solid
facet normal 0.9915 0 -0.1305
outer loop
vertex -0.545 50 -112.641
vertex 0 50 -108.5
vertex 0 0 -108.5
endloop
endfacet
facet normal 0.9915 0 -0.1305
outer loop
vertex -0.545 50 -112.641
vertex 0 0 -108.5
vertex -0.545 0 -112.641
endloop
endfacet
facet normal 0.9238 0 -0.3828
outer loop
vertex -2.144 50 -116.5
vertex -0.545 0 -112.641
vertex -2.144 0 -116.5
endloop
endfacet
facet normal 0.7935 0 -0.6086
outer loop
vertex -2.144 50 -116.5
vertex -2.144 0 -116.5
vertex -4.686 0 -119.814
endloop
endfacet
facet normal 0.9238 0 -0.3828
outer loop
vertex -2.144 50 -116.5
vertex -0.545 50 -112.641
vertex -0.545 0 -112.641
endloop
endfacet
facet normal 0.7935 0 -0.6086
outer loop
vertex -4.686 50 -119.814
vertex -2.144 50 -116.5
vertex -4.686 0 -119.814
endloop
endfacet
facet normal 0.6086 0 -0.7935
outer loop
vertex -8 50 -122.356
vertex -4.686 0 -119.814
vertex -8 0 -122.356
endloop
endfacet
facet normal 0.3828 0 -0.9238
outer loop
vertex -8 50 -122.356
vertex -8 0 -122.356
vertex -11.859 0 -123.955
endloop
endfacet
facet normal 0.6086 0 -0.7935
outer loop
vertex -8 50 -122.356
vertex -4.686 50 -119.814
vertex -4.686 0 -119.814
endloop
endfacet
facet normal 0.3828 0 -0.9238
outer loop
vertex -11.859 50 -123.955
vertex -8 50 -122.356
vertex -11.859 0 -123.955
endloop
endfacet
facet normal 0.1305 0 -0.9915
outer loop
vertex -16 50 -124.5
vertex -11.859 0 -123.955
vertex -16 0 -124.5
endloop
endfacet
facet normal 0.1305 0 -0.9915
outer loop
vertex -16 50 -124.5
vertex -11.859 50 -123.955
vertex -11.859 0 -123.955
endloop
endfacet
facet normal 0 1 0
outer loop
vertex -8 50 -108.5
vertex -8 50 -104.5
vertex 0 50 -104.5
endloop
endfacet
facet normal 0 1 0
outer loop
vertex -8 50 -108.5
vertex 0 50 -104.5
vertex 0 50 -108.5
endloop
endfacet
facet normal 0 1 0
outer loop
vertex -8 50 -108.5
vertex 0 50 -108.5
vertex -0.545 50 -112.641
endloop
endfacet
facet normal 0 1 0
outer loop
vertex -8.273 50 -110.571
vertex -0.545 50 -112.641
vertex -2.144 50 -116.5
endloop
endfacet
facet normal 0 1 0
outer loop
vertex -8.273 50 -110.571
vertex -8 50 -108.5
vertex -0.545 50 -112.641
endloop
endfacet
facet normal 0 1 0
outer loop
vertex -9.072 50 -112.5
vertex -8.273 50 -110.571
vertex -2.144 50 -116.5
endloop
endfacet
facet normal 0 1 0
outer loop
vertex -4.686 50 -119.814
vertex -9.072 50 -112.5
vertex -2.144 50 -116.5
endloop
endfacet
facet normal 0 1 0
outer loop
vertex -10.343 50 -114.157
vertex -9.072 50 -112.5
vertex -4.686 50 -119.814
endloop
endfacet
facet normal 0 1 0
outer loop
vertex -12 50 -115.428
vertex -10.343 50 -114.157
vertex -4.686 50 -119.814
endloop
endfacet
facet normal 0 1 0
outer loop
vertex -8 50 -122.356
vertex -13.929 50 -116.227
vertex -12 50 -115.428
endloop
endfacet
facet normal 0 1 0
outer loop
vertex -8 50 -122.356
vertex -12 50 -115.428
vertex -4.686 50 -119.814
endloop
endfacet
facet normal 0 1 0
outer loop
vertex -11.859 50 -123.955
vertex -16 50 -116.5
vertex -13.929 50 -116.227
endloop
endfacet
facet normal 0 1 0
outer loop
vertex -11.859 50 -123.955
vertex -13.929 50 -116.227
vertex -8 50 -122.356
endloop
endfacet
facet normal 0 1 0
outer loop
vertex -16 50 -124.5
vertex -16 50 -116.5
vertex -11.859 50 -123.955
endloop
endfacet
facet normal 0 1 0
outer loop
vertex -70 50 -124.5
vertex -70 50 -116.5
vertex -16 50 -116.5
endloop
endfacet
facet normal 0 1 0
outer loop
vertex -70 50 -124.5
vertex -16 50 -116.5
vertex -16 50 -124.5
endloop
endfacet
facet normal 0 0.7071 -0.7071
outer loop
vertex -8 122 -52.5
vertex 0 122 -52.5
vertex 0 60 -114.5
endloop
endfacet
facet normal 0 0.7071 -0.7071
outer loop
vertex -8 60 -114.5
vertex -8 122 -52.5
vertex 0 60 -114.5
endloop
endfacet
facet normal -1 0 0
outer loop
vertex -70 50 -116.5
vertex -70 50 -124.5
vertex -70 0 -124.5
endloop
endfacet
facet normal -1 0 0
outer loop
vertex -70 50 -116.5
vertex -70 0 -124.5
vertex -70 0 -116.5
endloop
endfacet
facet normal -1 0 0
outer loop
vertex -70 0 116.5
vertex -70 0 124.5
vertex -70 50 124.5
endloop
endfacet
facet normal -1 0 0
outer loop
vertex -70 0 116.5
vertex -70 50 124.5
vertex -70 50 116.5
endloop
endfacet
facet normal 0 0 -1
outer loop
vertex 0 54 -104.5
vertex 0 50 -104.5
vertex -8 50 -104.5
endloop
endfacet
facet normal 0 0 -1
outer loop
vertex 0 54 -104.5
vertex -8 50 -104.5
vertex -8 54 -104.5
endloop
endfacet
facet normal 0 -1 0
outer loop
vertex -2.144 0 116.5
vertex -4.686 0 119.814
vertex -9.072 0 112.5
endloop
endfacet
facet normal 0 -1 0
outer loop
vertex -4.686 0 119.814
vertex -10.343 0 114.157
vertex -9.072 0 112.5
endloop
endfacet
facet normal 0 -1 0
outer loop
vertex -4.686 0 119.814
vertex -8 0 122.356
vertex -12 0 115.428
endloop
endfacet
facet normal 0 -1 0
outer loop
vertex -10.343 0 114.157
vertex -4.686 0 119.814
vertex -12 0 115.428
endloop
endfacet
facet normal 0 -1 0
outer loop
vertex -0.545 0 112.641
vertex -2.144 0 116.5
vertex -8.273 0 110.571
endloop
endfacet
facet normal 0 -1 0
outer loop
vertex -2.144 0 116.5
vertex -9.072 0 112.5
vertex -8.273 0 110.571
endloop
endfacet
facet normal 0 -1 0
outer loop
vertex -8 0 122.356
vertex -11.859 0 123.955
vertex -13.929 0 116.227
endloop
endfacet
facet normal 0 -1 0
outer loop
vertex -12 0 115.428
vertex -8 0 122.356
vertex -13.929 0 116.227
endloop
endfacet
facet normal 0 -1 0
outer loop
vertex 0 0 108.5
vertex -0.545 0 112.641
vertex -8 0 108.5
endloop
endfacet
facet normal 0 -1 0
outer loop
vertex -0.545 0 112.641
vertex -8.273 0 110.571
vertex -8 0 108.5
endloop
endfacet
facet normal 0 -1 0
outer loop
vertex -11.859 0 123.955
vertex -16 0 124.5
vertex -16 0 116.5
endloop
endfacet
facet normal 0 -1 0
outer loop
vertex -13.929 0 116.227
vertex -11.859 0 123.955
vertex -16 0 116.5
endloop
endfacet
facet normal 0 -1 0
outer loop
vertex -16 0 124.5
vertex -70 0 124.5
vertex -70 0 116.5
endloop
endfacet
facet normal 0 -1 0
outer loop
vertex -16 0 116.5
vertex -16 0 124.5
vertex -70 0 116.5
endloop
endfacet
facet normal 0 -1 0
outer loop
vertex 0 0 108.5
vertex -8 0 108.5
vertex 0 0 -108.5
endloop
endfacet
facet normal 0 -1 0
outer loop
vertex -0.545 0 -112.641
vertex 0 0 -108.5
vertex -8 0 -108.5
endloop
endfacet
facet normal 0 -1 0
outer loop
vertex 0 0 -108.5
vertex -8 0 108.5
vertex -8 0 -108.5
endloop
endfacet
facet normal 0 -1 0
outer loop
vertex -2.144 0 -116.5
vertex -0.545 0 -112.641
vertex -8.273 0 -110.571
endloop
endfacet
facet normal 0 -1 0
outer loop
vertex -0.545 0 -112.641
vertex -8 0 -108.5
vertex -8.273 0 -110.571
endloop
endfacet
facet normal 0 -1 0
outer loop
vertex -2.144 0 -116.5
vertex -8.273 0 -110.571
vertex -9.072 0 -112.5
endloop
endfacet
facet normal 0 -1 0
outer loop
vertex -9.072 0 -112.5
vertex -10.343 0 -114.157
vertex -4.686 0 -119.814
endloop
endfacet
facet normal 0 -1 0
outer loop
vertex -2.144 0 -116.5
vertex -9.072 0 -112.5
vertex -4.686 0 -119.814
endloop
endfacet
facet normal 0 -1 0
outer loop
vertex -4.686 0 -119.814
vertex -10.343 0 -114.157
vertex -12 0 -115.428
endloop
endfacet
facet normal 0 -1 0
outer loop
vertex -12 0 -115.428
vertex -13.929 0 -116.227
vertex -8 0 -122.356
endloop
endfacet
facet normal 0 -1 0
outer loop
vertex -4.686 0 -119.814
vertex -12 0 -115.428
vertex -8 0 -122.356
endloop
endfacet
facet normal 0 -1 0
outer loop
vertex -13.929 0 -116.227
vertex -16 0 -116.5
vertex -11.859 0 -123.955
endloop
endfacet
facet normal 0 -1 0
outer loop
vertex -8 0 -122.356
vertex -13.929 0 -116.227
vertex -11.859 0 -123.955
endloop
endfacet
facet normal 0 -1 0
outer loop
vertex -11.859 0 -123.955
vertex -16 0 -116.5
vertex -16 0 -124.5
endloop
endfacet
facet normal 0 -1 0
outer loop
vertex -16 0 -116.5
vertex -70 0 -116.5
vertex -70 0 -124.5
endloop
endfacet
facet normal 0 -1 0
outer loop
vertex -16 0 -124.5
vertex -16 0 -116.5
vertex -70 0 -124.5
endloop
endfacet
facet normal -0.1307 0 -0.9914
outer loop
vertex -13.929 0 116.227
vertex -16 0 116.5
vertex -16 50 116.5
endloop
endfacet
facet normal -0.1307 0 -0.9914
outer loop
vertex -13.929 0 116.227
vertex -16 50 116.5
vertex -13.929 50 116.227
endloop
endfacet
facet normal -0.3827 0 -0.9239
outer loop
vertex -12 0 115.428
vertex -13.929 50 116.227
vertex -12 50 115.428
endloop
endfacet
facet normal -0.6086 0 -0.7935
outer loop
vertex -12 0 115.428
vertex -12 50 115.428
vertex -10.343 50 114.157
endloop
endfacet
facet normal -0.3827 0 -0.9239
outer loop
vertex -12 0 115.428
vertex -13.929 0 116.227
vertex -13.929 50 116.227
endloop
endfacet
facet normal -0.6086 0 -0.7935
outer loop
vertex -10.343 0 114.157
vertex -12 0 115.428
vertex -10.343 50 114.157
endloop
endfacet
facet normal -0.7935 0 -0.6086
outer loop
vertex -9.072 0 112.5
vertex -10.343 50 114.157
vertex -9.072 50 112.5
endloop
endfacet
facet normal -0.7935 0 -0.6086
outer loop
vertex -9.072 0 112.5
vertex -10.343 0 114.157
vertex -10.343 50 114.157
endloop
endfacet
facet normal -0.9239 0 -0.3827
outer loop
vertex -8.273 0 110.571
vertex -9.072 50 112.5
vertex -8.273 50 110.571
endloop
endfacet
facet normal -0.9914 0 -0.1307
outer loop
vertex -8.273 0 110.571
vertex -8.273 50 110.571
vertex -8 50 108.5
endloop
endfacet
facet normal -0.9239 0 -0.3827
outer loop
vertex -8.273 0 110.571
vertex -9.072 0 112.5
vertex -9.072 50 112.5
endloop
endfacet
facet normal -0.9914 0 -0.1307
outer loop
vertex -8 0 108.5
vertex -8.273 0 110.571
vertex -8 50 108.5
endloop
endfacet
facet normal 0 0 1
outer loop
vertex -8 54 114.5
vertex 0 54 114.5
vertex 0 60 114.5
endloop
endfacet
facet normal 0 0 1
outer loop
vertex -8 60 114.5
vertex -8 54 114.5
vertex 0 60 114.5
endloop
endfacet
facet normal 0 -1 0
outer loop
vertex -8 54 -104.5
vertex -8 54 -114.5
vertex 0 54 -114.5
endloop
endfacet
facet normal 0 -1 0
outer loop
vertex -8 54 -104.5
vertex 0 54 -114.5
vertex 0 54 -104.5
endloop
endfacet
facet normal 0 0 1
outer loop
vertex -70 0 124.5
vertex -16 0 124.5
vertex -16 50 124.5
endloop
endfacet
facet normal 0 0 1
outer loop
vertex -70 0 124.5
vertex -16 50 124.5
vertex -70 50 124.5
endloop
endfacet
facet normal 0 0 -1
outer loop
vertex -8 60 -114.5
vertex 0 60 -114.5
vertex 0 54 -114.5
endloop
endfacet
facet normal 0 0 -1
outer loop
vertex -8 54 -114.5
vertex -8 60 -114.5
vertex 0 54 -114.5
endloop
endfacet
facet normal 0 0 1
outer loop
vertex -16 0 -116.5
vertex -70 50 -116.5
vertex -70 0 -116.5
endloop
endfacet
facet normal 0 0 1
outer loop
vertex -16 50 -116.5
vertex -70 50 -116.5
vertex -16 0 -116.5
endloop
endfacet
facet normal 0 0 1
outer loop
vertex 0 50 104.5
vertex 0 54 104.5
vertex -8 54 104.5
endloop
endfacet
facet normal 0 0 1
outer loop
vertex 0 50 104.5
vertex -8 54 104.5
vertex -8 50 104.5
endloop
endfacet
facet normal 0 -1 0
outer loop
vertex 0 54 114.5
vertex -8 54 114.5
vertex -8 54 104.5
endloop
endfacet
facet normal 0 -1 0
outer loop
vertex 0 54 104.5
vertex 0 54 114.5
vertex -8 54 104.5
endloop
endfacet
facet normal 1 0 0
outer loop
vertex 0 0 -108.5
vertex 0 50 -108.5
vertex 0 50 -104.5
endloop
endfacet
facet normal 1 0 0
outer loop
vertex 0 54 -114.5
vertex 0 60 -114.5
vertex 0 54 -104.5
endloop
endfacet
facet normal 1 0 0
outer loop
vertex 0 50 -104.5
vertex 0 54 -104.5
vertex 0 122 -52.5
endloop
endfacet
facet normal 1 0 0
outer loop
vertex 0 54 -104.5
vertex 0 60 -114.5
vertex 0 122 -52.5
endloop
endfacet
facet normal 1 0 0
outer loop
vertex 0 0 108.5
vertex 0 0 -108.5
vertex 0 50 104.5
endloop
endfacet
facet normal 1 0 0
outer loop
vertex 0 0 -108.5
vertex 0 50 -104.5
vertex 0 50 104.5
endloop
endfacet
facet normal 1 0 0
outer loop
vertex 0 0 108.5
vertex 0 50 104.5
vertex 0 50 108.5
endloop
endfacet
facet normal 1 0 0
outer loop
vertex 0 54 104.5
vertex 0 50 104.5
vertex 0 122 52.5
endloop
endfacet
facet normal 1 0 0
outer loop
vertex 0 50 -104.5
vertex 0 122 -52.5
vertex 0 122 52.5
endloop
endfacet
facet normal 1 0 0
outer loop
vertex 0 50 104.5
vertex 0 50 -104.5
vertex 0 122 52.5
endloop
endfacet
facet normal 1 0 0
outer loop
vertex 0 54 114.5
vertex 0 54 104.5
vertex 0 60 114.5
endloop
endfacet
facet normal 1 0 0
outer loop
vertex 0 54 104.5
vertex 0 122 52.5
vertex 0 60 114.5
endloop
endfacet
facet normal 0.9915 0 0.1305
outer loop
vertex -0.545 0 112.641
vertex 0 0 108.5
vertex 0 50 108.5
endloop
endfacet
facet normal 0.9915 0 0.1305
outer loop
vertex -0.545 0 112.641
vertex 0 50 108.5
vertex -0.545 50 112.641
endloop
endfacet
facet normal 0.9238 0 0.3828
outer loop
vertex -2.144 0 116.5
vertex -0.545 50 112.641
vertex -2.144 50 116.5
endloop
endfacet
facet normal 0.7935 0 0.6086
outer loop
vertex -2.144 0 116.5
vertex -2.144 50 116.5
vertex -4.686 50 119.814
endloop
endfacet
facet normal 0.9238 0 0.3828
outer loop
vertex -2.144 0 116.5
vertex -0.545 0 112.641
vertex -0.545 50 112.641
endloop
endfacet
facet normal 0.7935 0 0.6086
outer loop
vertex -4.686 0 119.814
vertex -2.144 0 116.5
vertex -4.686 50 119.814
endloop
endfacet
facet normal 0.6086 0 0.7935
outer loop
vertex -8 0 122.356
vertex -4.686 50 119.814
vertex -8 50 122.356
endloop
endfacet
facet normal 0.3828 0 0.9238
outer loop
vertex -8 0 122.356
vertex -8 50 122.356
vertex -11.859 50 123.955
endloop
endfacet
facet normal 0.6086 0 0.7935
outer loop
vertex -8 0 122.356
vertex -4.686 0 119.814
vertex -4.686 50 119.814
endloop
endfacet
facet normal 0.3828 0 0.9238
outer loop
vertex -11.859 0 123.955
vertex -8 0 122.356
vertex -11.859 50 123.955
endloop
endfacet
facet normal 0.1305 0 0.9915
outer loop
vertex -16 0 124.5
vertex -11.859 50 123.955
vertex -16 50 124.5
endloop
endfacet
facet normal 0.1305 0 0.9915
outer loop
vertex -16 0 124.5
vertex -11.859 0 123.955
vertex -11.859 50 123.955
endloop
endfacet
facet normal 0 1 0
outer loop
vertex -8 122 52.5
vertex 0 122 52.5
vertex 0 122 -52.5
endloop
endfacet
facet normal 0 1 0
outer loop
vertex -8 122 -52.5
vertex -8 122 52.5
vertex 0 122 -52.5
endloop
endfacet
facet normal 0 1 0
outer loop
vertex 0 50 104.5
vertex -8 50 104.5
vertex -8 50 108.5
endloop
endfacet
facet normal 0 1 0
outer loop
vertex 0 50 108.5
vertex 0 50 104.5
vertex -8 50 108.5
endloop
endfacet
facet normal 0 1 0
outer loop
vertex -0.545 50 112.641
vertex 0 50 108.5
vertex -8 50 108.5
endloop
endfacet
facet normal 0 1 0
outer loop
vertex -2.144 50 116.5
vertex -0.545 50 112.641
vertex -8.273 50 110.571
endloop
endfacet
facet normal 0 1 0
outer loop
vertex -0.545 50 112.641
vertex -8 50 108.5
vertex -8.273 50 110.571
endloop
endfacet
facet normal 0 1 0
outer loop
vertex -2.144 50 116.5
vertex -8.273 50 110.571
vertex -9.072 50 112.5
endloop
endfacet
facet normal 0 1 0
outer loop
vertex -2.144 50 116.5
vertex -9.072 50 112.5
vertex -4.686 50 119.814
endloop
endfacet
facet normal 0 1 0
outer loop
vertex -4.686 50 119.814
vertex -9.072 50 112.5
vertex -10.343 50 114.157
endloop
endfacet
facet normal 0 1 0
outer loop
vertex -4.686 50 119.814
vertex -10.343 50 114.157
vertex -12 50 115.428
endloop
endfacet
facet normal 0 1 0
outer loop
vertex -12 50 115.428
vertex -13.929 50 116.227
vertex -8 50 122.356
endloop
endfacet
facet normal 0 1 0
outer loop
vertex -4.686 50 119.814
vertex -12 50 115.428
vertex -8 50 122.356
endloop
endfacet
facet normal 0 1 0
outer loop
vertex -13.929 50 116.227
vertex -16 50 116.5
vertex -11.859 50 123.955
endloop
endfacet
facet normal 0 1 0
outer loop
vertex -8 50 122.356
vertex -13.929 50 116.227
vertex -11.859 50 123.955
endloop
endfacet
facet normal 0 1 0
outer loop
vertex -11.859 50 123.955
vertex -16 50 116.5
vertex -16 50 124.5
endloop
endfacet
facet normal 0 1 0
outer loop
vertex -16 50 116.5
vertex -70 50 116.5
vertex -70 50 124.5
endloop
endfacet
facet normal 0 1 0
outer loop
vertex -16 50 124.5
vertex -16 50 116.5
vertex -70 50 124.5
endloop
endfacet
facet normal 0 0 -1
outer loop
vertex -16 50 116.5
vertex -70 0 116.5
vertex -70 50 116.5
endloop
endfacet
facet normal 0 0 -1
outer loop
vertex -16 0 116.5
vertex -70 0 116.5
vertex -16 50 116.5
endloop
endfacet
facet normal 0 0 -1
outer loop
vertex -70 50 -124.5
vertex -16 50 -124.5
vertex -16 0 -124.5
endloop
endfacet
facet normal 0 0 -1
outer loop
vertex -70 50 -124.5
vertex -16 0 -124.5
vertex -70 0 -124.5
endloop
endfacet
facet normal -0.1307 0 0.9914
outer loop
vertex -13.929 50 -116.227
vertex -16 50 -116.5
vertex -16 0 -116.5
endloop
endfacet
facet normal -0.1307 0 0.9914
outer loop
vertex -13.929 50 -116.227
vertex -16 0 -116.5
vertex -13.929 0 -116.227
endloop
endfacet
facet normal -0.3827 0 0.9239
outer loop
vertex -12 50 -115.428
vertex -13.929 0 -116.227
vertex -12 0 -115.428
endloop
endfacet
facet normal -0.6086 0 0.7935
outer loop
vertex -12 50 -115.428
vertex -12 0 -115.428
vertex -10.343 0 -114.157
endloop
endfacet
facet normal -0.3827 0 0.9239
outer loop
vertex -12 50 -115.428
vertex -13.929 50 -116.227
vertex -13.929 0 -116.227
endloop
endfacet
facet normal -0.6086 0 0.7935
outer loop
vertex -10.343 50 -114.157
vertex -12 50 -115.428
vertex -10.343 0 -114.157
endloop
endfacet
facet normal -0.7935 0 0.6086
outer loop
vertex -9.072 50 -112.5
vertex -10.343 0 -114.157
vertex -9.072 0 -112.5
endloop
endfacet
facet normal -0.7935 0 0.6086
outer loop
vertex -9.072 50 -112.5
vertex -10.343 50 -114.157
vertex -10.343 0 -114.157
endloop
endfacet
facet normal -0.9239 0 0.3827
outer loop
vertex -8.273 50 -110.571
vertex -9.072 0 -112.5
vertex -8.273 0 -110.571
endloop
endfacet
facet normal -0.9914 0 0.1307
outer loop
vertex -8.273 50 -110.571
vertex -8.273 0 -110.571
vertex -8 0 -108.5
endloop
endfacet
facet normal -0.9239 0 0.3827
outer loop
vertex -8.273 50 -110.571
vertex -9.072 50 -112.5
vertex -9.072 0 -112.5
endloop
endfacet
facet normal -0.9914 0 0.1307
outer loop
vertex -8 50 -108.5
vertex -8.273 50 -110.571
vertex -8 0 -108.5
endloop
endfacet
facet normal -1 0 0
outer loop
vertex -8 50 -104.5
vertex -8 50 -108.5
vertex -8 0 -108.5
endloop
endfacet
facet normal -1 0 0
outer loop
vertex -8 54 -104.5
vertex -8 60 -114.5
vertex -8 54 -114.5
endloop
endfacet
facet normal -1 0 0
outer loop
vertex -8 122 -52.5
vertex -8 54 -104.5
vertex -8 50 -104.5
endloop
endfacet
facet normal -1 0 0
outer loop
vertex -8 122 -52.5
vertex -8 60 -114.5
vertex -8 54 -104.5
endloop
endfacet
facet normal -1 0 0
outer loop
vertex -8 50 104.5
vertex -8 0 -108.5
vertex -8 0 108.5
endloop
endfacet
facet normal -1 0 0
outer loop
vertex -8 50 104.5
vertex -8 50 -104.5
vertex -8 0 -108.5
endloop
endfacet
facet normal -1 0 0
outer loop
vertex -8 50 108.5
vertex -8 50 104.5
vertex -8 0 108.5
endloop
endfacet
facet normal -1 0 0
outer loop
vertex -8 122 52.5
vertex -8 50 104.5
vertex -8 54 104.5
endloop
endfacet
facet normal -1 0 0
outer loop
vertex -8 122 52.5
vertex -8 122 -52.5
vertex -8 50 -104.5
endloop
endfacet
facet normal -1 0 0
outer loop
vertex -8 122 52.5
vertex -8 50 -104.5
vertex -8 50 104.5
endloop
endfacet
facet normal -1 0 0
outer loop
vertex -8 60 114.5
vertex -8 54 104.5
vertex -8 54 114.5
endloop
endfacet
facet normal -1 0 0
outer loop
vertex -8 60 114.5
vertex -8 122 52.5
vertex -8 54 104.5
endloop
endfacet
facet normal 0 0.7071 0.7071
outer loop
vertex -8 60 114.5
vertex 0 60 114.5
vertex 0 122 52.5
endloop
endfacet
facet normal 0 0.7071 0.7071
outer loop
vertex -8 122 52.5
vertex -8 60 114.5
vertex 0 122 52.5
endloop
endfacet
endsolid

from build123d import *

# Parameters (mm, degrees)
SM_BASE_FLANGE_1_DEPTH              = 8
SM_EDGE_FLANGE_1_STRIP_W            = 48
SM_EDGE_FLANGE_1_STRIP_H            = 8
SM_EDGE_FLANGE_1_STRIP_CUT_DEPTH    = 50
SM_EDGE_FLANGE_1_RELIEF_W           = 52
SM_EDGE_FLANGE_1_RELIEF_H           = 4
SM_EDGE_FLANGE_1_RELIEF_CUT_DEPTH   = 8
SM_EDGE_FLANGE_1_STRIP_2_W          = 48
SM_EDGE_FLANGE_1_STRIP_2_H          = 8
SM_EDGE_FLANGE_1_STRIP_CUT_2_DEPTH  = 50
SM_EDGE_FLANGE_1_RELIEF_2_W         = 52
SM_EDGE_FLANGE_1_RELIEF_2_H         = 4
SM_EDGE_FLANGE_1_RELIEF_CUT_2_DEPTH = 8
SM_EDGE_FLANGE_1_DEPTH              = 50
SM_EDGE_FLANGE_1_BEND_DEPTH         = 50


# Sheet-metal steps are written as plain solids
with BuildPart() as part:
    # Sketch 1 → 基体-法兰1 (new body)
    with BuildSketch(Plane(origin=(0, 0, 0), x_dir=(0, 0, -1), z_dir=(1, 0, 0))):
        Polygon((-52.5, 122), (52.5, 122), (114.5, 60), (114.5, 50), (124.5, 50), (124.5, 0), (-124.5, 0), (-124.5, 50), (-114.5, 50), (-114.5, 60), align=None)
    extrude(amount=-SM_BASE_FLANGE_1_DEPTH)

    # 边线-法兰1 strip (across the edge) → 边线-法兰1 strip cut (cut)
    with BuildSketch(Plane(origin=(-8, 0, 124.5), x_dir=(0, 0, -1), z_dir=(0, 1, 0))):
        with Locations((-8, -4)):
            Rectangle(SM_EDGE_FLANGE_1_STRIP_W, SM_EDGE_FLANGE_1_STRIP_H)
    extrude(amount=SM_EDGE_FLANGE_1_STRIP_CUT_DEPTH, mode=Mode.SUBTRACT)

    # 边线-法兰1 relief (on the sheet) → 边线-法兰1 relief cut (cut)
    with BuildSketch(Plane(origin=(-8, 0, 108.5), x_dir=(0, 0, -1), z_dir=(-1, 0, 0))):
        with Locations((-22, -52)):
            Rectangle(SM_EDGE_FLANGE_1_RELIEF_W, SM_EDGE_FLANGE_1_RELIEF_H)
    extrude(amount=-SM_EDGE_FLANGE_1_RELIEF_CUT_DEPTH, mode=Mode.SUBTRACT)

    # 边线-法兰1 strip 2 (across the edge) → 边线-法兰1 strip cut 2 (cut)
    with BuildSketch(Plane(origin=(-8, 50, -124.5), x_dir=(0, 0, 1), z_dir=(0, -1, 0))):
        with Locations((-8, -4)):
            Rectangle(SM_EDGE_FLANGE_1_STRIP_2_W, SM_EDGE_FLANGE_1_STRIP_2_H)
    extrude(amount=SM_EDGE_FLANGE_1_STRIP_CUT_2_DEPTH, mode=Mode.SUBTRACT)

    # 边线-法兰1 relief 2 (on the sheet) → 边线-法兰1 relief cut 2 (cut)
    with BuildSketch(Plane(origin=(-8, 50, -108.5), x_dir=(0, 0, 1), z_dir=(-1, 0, 0))):
        with Locations((-22, 2)):
            Rectangle(SM_EDGE_FLANGE_1_RELIEF_2_W, SM_EDGE_FLANGE_1_RELIEF_2_H)
    extrude(amount=-SM_EDGE_FLANGE_1_RELIEF_CUT_2_DEPTH, mode=Mode.SUBTRACT)

    # 边线-法兰1 section (across the edge) → 边线-法兰1 (add)
    with BuildSketch(Plane(origin=(-8, 0, 124.5), x_dir=(0, 0, -1), z_dir=(0, 1, 0))):
        with BuildLine():
            Line((0, 8), (0, 62))
            Line((0, 62), (8, 62))
            Line((8, 62), (8, 8))
            ThreePointArc((8, 8), (10.343145751, 2.343145751), (16, 0))
            Line((16, 0), (16, -8))
            ThreePointArc((16, -8), (4.686291501, -3.313708499), (0, 8))
        make_face()
    extrude(amount=SM_EDGE_FLANGE_1_DEPTH)

    # 边线-法兰1 section 2 (across the edge) → 边线-法兰1 bend (add)
    with BuildSketch(Plane(origin=(-8, 50, -124.5), x_dir=(0, 0, 1), z_dir=(0, -1, 0))):
        with BuildLine():
            Line((0, 8), (0, 62))
            Line((0, 62), (8, 62))
            Line((8, 62), (8, 8))
            ThreePointArc((8, 8), (10.343145751, 2.343145751), (16, 0))
            Line((16, 0), (16, -8))
            ThreePointArc((16, -8), (4.686291501, -3.313708499), (0, 8))
        make_face()
    extrude(amount=SM_EDGE_FLANGE_1_BEND_DEPTH)


solid = part.part
